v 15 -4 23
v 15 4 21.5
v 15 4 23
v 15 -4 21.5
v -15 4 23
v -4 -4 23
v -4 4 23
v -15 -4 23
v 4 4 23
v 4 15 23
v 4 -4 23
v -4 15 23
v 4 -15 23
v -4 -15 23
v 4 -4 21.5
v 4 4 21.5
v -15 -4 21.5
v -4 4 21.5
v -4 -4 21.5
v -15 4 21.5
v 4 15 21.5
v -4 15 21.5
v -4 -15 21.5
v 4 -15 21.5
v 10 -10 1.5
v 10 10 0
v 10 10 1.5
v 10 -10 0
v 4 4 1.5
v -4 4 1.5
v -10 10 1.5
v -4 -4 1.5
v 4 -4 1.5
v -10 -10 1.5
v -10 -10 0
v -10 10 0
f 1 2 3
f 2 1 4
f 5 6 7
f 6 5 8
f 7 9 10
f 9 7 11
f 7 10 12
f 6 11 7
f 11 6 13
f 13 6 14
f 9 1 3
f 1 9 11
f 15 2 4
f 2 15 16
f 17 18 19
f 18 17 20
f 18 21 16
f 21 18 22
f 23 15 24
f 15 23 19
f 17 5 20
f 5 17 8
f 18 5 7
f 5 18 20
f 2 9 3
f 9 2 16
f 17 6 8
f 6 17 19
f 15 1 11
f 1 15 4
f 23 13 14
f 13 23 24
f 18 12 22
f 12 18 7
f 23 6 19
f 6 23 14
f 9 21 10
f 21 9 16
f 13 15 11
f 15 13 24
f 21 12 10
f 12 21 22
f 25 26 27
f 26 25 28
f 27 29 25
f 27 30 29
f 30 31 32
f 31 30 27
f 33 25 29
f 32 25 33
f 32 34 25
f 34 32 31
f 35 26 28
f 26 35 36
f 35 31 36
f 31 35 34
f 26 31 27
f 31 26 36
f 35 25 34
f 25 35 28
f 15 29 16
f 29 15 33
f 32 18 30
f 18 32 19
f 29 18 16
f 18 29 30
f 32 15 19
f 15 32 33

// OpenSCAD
base_length=20;
top_length=30;
post_width=8;
post_height=20;
base_thickness=1.5;
top_thickness=1.5;

// Base
translate([-base_length/2, -base_length/2, 0]) cube([base_length, base_length, base_thickness]);

// Post
translate([-post_width/2, -post_width/2, 0]) cube([post_width, post_width, base_thickness+post_height+top_thickness]);

// Top
for (i = [0:90:90]) { 
  rotate([0, 0, i])
    translate([-top_length/2, -post_width/2, base_thickness+post_height]) 
      cube([top_length, post_width, top_thickness]);
}
